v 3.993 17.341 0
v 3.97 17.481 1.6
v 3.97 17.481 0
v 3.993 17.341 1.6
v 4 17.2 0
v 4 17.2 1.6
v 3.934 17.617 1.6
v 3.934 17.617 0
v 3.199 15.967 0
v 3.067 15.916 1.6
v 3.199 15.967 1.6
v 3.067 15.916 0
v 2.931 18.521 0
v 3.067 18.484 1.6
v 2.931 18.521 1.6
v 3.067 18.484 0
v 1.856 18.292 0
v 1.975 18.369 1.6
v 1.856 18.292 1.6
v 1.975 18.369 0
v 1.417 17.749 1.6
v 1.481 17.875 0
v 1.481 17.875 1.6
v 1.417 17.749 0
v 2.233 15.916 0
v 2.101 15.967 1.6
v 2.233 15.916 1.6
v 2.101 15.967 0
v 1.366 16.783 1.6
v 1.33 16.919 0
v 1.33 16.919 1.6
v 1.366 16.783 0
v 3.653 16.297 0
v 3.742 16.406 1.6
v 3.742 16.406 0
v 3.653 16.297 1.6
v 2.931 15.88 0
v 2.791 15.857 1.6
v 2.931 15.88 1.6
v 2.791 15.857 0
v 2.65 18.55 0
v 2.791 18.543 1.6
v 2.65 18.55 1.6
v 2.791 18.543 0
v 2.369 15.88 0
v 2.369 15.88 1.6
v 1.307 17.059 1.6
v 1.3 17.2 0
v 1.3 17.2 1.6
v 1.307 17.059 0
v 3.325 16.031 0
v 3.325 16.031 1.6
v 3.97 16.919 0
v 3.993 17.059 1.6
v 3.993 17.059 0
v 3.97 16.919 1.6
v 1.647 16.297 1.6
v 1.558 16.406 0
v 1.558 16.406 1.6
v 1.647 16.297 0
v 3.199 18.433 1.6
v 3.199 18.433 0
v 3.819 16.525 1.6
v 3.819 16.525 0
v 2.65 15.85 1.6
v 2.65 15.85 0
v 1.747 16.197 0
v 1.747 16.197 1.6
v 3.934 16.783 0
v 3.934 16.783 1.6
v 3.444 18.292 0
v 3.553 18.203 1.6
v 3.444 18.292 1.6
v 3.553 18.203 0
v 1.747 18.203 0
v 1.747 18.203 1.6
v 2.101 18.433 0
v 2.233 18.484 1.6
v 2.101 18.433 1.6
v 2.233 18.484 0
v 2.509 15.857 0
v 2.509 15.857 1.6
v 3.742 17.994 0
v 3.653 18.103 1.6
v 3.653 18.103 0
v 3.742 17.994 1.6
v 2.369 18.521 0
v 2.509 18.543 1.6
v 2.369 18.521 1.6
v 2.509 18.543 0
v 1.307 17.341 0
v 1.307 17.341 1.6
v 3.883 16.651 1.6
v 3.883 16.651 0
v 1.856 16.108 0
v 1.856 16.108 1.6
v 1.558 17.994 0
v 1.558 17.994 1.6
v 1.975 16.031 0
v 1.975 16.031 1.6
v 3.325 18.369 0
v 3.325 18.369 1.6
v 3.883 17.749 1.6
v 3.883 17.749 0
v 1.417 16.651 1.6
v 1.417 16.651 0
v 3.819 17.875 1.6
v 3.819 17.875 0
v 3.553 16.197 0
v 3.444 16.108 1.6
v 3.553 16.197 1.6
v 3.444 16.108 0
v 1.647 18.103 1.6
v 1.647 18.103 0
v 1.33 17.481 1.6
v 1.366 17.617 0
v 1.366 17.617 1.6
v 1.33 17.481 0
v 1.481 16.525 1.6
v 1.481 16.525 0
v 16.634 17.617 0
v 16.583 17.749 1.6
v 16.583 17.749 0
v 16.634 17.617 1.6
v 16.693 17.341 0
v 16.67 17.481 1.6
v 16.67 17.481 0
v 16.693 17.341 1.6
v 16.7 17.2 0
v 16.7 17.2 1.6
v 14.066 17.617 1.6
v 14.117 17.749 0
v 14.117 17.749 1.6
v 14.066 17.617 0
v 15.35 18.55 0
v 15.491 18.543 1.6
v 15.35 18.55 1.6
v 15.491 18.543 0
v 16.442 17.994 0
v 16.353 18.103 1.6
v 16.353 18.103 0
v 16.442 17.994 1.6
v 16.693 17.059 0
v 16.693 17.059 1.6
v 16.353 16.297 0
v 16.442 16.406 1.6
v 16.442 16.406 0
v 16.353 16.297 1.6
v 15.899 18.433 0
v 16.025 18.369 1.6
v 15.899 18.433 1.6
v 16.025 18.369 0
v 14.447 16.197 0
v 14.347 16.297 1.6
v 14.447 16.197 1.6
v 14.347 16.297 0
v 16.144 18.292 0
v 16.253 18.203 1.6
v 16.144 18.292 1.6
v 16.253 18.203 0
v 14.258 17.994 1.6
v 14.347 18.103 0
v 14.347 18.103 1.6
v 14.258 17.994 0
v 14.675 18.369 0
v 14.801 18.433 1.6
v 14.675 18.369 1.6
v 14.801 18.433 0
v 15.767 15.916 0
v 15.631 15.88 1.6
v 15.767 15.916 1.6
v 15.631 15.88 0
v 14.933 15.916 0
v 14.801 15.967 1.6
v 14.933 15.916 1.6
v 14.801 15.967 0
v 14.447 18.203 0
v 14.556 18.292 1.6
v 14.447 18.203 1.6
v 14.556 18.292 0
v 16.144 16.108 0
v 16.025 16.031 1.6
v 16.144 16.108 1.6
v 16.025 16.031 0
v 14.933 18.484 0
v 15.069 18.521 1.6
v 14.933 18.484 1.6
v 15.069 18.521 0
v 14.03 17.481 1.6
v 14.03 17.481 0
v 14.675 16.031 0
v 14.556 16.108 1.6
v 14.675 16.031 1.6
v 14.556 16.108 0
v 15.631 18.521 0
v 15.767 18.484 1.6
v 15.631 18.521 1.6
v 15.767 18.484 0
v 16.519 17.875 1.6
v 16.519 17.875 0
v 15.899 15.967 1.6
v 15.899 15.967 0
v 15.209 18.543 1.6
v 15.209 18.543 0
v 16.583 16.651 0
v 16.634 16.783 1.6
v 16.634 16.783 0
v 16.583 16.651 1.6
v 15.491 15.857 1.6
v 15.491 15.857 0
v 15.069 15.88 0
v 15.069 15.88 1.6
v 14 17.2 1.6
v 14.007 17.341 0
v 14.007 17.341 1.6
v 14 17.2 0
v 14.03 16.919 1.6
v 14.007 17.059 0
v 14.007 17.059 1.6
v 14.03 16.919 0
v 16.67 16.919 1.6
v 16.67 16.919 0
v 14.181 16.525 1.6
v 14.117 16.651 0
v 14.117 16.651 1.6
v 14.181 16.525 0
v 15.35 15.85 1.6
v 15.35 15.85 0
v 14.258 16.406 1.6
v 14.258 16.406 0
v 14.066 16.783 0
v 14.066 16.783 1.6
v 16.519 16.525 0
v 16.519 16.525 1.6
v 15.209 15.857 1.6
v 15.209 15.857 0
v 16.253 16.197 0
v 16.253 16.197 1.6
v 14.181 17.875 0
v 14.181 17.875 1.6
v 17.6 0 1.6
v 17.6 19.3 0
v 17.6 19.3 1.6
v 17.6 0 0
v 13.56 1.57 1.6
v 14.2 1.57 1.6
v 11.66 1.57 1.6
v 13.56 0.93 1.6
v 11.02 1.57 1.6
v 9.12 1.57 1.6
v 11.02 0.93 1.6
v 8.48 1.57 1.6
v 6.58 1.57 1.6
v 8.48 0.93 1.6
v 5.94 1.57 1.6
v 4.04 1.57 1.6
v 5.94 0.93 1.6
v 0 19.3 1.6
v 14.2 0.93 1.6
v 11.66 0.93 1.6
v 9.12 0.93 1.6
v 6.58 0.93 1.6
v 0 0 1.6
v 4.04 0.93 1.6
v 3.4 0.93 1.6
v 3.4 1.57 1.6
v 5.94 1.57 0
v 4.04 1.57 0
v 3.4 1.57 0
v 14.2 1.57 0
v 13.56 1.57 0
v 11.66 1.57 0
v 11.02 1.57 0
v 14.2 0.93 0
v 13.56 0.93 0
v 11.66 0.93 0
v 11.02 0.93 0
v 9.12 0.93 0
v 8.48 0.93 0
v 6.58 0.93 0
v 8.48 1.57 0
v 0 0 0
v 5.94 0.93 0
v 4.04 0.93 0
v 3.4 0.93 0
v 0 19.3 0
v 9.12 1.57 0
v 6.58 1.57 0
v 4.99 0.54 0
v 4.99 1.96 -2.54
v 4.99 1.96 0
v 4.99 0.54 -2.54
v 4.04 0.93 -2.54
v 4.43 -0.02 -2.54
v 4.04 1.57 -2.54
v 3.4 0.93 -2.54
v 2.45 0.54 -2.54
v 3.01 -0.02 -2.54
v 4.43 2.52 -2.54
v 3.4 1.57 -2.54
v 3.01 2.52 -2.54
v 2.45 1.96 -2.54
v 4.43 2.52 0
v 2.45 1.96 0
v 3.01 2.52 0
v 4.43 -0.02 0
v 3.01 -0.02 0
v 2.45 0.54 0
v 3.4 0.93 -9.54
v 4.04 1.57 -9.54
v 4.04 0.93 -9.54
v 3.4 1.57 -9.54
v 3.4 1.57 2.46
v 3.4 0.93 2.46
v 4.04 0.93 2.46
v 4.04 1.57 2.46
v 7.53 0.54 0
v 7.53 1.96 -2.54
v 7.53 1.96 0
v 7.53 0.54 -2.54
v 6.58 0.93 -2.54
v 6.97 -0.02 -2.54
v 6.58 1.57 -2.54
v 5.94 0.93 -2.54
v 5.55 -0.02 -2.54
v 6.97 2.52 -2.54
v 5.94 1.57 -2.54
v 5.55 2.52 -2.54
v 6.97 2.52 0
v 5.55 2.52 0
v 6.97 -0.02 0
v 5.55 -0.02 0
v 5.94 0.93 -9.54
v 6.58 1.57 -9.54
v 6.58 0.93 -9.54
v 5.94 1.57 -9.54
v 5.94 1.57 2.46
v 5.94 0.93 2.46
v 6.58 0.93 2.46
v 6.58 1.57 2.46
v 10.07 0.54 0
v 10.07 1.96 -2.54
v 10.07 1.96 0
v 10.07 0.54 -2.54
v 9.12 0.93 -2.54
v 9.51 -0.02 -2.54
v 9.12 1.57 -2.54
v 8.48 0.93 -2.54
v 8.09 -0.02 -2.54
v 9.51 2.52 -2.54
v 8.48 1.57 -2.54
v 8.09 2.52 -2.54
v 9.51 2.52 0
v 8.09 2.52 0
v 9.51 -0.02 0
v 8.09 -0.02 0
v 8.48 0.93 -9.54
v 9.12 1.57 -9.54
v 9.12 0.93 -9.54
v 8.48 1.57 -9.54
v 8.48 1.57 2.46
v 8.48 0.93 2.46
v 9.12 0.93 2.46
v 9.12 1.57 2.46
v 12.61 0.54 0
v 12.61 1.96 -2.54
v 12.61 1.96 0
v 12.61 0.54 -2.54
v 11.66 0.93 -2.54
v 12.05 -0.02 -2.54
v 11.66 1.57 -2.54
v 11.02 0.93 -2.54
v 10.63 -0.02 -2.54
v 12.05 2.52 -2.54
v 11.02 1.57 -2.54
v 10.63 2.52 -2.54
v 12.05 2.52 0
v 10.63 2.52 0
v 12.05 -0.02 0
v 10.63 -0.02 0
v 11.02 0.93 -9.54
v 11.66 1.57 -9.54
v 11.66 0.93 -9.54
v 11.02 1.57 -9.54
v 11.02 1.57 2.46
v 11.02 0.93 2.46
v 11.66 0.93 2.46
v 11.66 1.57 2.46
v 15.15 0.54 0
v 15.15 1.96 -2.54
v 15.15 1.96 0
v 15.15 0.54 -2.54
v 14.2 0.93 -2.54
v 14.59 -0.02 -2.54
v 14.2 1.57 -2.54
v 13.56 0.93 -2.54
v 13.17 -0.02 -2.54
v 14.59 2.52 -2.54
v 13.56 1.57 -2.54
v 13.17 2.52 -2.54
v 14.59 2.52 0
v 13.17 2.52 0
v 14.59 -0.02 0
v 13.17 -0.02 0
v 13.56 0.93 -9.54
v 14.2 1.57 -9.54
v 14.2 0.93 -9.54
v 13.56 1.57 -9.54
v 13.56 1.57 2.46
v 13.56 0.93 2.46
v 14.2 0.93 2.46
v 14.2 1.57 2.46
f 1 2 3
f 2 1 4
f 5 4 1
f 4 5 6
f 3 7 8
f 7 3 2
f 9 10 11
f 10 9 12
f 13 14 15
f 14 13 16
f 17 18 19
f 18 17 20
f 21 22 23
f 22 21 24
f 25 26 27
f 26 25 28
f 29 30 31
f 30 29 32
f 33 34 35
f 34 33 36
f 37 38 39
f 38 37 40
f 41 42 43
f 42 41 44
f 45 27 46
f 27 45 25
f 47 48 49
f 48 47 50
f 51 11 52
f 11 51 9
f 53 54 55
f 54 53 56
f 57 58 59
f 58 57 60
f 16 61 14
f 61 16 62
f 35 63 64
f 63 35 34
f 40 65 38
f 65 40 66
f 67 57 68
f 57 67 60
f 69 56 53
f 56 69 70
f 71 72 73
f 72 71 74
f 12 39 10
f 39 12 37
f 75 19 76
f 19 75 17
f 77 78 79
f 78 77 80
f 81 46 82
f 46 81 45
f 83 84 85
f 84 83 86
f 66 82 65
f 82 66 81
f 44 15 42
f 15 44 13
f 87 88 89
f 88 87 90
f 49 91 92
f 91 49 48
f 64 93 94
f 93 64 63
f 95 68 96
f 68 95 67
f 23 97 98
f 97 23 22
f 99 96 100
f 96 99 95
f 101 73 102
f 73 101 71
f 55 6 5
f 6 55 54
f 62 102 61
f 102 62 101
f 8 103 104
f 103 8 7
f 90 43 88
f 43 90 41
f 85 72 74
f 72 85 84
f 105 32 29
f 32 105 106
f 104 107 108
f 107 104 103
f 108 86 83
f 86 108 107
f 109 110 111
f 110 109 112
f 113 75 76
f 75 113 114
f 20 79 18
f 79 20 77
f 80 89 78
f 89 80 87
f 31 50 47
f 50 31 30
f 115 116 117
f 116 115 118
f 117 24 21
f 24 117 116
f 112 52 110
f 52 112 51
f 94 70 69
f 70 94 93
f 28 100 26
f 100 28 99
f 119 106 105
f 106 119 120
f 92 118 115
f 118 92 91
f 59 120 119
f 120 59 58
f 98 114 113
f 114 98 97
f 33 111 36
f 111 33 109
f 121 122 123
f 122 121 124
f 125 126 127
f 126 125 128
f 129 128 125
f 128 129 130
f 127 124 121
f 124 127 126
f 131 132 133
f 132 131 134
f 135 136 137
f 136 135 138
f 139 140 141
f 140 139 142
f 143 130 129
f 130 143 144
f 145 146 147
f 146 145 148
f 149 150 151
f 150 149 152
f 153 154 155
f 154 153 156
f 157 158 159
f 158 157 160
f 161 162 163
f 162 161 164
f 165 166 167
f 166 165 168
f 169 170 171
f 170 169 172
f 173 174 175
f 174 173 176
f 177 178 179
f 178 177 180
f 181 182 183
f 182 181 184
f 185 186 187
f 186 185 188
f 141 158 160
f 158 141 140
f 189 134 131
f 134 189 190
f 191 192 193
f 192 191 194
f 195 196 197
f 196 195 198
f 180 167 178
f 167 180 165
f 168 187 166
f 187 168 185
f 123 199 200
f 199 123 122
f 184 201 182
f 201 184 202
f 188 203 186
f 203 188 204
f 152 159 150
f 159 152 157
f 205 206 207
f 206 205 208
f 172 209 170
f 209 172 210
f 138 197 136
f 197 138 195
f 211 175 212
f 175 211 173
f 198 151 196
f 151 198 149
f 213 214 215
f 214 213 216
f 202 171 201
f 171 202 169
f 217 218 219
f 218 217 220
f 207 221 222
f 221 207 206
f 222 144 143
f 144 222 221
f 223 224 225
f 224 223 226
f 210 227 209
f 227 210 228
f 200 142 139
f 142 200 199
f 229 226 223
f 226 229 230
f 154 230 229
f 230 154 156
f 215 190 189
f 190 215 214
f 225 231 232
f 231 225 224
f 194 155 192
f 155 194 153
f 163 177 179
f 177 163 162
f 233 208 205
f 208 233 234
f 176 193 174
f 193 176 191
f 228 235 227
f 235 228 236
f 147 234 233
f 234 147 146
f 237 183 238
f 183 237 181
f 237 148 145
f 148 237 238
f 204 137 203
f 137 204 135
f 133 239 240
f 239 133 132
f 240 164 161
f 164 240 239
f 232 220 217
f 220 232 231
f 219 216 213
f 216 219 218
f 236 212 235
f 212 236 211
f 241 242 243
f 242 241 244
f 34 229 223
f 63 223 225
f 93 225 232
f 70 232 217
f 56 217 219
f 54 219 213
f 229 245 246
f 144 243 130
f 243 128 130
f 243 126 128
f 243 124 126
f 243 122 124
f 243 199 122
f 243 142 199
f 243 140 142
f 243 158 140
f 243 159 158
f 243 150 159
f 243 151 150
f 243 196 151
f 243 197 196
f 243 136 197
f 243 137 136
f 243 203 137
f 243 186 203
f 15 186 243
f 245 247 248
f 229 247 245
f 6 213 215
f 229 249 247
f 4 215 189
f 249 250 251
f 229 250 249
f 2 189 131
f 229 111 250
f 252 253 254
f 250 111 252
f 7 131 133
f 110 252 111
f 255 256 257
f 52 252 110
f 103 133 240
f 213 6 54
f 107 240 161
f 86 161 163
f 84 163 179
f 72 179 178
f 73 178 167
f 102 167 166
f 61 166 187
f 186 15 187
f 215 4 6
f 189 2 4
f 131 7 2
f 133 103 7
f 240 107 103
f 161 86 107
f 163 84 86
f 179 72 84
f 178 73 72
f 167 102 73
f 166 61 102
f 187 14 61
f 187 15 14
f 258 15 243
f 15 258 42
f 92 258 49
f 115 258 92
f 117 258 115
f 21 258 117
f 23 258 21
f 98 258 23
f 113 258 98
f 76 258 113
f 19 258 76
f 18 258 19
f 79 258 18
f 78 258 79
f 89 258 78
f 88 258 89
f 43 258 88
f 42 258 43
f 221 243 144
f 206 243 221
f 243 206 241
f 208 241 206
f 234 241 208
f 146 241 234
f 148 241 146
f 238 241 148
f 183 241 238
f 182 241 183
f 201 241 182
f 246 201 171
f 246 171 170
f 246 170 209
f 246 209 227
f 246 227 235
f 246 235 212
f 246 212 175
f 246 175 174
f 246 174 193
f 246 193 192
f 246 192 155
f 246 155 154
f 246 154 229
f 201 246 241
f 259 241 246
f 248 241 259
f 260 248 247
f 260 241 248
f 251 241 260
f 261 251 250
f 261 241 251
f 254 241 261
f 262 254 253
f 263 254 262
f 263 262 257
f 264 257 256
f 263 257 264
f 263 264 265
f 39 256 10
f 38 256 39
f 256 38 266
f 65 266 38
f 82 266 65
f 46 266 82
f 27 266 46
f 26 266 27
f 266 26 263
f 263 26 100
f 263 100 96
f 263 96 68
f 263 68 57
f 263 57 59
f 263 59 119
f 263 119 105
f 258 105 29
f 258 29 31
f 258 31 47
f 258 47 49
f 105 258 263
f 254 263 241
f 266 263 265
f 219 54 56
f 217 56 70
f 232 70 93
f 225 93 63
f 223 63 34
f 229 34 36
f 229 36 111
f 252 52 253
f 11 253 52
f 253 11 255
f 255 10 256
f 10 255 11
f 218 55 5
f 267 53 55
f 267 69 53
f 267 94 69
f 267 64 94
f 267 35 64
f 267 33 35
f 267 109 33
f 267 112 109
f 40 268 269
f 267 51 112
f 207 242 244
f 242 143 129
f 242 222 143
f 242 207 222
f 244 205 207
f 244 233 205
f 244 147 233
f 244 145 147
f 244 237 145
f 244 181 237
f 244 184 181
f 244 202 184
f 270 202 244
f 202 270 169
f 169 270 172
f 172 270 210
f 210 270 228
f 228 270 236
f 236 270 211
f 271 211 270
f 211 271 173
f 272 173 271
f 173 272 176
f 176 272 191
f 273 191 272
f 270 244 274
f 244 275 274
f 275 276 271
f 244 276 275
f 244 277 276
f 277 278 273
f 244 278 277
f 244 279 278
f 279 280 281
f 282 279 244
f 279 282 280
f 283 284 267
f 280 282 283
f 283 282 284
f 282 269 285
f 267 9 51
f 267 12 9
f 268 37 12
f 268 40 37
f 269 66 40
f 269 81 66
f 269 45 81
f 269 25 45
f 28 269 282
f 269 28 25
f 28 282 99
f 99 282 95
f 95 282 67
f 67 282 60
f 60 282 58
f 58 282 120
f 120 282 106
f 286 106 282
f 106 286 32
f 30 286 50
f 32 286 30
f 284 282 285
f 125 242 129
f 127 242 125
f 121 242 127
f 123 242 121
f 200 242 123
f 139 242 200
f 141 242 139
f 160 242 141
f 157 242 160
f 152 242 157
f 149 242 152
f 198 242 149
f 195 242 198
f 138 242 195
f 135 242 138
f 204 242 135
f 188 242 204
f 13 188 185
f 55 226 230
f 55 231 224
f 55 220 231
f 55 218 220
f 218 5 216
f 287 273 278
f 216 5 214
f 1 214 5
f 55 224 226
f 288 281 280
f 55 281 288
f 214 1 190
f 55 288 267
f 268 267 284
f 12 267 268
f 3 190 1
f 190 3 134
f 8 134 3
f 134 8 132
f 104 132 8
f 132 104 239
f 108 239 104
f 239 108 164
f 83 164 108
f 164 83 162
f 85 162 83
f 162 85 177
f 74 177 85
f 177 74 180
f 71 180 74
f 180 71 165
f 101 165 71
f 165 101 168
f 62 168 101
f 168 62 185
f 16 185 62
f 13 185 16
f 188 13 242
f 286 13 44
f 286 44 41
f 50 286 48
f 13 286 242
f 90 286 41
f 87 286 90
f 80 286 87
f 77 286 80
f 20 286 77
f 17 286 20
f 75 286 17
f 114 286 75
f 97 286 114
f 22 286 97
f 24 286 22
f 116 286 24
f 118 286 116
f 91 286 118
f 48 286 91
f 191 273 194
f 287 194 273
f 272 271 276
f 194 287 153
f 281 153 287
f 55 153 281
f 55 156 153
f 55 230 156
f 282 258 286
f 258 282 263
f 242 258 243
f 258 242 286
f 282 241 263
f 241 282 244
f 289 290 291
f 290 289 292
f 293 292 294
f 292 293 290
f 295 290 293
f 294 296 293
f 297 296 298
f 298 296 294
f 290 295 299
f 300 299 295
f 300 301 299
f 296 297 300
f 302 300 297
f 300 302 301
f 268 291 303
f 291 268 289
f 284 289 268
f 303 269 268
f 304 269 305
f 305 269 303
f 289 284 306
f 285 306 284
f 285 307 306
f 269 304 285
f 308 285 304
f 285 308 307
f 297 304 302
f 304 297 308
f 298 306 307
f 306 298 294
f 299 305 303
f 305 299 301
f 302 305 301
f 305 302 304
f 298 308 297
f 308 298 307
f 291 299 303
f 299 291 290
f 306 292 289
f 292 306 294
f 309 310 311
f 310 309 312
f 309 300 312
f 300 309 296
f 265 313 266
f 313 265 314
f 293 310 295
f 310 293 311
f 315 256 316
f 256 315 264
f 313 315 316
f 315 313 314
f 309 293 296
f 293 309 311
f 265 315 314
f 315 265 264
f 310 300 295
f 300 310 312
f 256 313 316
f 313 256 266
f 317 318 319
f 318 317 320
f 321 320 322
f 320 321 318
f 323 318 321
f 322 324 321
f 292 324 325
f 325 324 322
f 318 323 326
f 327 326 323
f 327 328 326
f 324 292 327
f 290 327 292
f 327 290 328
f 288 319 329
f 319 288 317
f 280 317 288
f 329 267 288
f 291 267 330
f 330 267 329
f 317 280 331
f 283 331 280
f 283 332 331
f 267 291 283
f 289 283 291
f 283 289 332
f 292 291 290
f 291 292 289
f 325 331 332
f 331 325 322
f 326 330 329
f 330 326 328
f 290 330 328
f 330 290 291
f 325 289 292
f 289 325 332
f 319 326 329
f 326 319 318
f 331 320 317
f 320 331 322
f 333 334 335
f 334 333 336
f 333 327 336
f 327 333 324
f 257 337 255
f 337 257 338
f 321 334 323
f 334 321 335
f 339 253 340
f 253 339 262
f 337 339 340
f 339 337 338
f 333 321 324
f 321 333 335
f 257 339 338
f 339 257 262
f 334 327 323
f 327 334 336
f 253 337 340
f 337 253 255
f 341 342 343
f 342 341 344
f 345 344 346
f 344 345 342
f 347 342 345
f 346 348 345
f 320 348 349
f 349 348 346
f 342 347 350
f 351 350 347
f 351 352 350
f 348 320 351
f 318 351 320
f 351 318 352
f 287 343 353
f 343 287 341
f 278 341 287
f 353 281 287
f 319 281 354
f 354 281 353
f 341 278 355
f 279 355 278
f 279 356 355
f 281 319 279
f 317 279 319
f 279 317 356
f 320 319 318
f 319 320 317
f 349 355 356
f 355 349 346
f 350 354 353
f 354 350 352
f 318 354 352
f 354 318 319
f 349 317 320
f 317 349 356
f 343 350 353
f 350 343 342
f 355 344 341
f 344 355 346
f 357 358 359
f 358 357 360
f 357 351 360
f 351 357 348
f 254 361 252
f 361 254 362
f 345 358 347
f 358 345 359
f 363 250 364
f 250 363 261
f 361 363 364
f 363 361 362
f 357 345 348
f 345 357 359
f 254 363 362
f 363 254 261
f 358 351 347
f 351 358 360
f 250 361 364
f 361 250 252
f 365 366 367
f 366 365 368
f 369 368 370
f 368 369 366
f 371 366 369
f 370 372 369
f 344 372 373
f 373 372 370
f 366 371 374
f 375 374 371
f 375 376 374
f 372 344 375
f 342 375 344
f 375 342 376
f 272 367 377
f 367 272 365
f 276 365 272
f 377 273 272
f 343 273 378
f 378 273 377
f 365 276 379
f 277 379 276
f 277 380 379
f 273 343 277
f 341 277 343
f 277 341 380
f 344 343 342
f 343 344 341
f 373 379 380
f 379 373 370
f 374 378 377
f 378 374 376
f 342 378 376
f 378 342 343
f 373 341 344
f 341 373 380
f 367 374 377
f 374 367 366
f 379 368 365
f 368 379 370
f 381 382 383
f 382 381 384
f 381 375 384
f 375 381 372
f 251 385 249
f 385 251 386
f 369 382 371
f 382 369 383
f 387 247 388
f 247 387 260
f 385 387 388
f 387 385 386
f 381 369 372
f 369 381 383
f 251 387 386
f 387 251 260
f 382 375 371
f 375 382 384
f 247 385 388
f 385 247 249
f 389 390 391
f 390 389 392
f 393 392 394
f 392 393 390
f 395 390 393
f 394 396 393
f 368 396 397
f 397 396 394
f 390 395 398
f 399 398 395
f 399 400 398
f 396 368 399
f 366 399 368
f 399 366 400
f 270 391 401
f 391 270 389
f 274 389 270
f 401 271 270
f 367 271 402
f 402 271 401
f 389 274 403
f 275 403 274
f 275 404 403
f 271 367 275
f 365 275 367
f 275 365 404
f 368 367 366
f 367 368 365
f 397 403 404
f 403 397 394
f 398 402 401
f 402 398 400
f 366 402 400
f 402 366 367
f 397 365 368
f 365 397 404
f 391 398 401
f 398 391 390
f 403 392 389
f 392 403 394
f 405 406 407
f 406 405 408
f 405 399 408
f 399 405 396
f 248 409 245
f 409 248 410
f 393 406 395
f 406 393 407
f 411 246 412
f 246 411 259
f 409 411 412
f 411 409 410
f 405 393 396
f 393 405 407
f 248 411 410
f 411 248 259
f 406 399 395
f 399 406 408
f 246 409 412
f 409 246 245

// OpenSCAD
// file: pin_headers.scad
// pin_headers.scad
//
// Model of through-hole pin headers. 
// 
// Units are metric
//
// "height" is the total length of the pin. Default is 12mm.
// "upper" is the length of the pin above the stopper. Default is 7mm.
// "rows" is the number of rows. Default is 3.
// "cols" is the number of columns. Default is 2.
//
// Examples:
// pin_header( 12, 7, 2, 5);
// pin_header( rows=5 cols=1 );
// By Paul McGovern

module pin_header( height=12, upper=7, rows=3, cols=2 ) {

	cl = 2.54;

	translate( [ -(rows  * cl/2 ) + cl /2, -(cols  * cl/2 ) + cl /2, 0 ] ) {

		for( col = [0: cols -1 ] ) {
			for( row = [0 : rows -1 ] ) {

				translate( [ cl * row , cl * col, 0] ) {
	
					color( "gray" )
						translate( [0,0, cl / 2]) {
							intersection() {
								cube( [ cl, cl, cl ], center=true );
								rotate( [0, 0, 45] ) cube( [ 2.8, 2.8, cl ], center=true );
						}
				}

				color( "silver" ) {
					translate( [0,0, (upper - ( height/2 )) + cl ] ) {
						union() {
							cube( [0.64,0.64,height], center=true );
							translate( [0,0, height/2 ] ) scale( 0.64 ) _pin_point();
							translate( [0,0, -height/2 ] ) scale( 0.64 )	rotate([180,0,0] )_pin_point();
						}
					}
				}
			}
		}
	}
}
}

module _pin_point() {
	translate( [-0.5,-0.5, 0])
		polyhedron( 
			points=[[0,0,0],[0,1,0],[1,1,0],[1,0,0],[0.5,0.5,0.5]], 
			triangles=[[0,1,2],[0,2,3],[0,1,4],[1,2,4],[2,3,4],[3,0,4]]);
}
// file: sensor_modules.scad
// Sensor modules from Adafruit
// License GNU AFFERO GENERAL PUBLIC LICENSE v3+
// Copyright 2014 Christian Ege <k4230r6@gmail.com>


use <pin_headers.scad>;

sensor_drill_holes = 2.3;
sensor_z = 1.6;

// Humidity
htu21d_x = 16.5;
htu21d_y = 18.2;
htu21d_z = sensor_z;
htu21d_holes = [  [2.45,15.75],  [13.75,15.75]];

// Lux - Sensor
tsl2591_x = 19.1;
tsl2591_y = 16.4;
tsl2591_z = sensor_z;
tsl2591_holes = [ [2.45,13.7],  [15.15,13.7] ];

// Presure Sensor
bmp180_x = 17.6;
bmp180_y = 19.3;
bmp180_z = sensor_z;
bmp180_holes = [  [2.45,17.0],  [15.15,17.0]  ];


module base_sensor(clearance = 0,  size , holes, drill,rows) {
	echo( "size: ",size[0],size[1],size[2]);
	echo ("holes: ",holes);
	echo("drill: ", drill);
	echo("clearance:",clearance);
	difference () {
		cube(size);
		for(i = holes ) {
			translate ([clearance,clearance,-clearance]) {
				translate (i) {
					#cylinder(h =  size[2]+2*clearance , r=((drill/2)+clearance), $fn=60 ) ;
				}
			}
		}
	}
	translate([(size[0])/2,+1.25,0]) {
		rotate([180,0,0]) {
			pin_header(rows=rows,cols=1);
		}
	}
}


module htu21d (clearance = 0.0,drill=sensor_drill_holes)  {
	base_sensor(clearance = clearance, size=[htu21d_x,htu21d_y,htu21d_z], holes=htu21d_holes, drill=drill,rows=5) ;
}

module tsl2591 (clearance=0.0,drill=sensor_drill_holes )  {
	base_sensor(clearance = clearance, size=[tsl2591_x,tsl2591_y,tsl2591_z], holes=tsl2591_holes, drill=drill,rows=6) ;
}

module bmp180 (clearance=0.0, drill=sensor_drill_holes )  {
	base_sensor(clearance=clearance, size=[bmp180_x,bmp180_y,bmp180_z], holes=bmp180_holes, drill=drill,rows=5) ;
}

//bmp180(clearance=0.2, drill = sensor_drill_holes);
//tsl2591 (clearance=0.2, drill = sensor_drill_holes );
htu21d(clearance=0.2, drill = sensor_drill_holes );
// main file
// Sensor BMP180 module from Adafruit
// https://www.adafruit.com/products/1603
//
// License GNU AFFERO GENERAL PUBLIC LICENSE v3+
// Copyright 2014 Christian Ege <k4230r6@gmail.com>

use <sensor_modules.scad>;

bmp180(clearance=0.2);
